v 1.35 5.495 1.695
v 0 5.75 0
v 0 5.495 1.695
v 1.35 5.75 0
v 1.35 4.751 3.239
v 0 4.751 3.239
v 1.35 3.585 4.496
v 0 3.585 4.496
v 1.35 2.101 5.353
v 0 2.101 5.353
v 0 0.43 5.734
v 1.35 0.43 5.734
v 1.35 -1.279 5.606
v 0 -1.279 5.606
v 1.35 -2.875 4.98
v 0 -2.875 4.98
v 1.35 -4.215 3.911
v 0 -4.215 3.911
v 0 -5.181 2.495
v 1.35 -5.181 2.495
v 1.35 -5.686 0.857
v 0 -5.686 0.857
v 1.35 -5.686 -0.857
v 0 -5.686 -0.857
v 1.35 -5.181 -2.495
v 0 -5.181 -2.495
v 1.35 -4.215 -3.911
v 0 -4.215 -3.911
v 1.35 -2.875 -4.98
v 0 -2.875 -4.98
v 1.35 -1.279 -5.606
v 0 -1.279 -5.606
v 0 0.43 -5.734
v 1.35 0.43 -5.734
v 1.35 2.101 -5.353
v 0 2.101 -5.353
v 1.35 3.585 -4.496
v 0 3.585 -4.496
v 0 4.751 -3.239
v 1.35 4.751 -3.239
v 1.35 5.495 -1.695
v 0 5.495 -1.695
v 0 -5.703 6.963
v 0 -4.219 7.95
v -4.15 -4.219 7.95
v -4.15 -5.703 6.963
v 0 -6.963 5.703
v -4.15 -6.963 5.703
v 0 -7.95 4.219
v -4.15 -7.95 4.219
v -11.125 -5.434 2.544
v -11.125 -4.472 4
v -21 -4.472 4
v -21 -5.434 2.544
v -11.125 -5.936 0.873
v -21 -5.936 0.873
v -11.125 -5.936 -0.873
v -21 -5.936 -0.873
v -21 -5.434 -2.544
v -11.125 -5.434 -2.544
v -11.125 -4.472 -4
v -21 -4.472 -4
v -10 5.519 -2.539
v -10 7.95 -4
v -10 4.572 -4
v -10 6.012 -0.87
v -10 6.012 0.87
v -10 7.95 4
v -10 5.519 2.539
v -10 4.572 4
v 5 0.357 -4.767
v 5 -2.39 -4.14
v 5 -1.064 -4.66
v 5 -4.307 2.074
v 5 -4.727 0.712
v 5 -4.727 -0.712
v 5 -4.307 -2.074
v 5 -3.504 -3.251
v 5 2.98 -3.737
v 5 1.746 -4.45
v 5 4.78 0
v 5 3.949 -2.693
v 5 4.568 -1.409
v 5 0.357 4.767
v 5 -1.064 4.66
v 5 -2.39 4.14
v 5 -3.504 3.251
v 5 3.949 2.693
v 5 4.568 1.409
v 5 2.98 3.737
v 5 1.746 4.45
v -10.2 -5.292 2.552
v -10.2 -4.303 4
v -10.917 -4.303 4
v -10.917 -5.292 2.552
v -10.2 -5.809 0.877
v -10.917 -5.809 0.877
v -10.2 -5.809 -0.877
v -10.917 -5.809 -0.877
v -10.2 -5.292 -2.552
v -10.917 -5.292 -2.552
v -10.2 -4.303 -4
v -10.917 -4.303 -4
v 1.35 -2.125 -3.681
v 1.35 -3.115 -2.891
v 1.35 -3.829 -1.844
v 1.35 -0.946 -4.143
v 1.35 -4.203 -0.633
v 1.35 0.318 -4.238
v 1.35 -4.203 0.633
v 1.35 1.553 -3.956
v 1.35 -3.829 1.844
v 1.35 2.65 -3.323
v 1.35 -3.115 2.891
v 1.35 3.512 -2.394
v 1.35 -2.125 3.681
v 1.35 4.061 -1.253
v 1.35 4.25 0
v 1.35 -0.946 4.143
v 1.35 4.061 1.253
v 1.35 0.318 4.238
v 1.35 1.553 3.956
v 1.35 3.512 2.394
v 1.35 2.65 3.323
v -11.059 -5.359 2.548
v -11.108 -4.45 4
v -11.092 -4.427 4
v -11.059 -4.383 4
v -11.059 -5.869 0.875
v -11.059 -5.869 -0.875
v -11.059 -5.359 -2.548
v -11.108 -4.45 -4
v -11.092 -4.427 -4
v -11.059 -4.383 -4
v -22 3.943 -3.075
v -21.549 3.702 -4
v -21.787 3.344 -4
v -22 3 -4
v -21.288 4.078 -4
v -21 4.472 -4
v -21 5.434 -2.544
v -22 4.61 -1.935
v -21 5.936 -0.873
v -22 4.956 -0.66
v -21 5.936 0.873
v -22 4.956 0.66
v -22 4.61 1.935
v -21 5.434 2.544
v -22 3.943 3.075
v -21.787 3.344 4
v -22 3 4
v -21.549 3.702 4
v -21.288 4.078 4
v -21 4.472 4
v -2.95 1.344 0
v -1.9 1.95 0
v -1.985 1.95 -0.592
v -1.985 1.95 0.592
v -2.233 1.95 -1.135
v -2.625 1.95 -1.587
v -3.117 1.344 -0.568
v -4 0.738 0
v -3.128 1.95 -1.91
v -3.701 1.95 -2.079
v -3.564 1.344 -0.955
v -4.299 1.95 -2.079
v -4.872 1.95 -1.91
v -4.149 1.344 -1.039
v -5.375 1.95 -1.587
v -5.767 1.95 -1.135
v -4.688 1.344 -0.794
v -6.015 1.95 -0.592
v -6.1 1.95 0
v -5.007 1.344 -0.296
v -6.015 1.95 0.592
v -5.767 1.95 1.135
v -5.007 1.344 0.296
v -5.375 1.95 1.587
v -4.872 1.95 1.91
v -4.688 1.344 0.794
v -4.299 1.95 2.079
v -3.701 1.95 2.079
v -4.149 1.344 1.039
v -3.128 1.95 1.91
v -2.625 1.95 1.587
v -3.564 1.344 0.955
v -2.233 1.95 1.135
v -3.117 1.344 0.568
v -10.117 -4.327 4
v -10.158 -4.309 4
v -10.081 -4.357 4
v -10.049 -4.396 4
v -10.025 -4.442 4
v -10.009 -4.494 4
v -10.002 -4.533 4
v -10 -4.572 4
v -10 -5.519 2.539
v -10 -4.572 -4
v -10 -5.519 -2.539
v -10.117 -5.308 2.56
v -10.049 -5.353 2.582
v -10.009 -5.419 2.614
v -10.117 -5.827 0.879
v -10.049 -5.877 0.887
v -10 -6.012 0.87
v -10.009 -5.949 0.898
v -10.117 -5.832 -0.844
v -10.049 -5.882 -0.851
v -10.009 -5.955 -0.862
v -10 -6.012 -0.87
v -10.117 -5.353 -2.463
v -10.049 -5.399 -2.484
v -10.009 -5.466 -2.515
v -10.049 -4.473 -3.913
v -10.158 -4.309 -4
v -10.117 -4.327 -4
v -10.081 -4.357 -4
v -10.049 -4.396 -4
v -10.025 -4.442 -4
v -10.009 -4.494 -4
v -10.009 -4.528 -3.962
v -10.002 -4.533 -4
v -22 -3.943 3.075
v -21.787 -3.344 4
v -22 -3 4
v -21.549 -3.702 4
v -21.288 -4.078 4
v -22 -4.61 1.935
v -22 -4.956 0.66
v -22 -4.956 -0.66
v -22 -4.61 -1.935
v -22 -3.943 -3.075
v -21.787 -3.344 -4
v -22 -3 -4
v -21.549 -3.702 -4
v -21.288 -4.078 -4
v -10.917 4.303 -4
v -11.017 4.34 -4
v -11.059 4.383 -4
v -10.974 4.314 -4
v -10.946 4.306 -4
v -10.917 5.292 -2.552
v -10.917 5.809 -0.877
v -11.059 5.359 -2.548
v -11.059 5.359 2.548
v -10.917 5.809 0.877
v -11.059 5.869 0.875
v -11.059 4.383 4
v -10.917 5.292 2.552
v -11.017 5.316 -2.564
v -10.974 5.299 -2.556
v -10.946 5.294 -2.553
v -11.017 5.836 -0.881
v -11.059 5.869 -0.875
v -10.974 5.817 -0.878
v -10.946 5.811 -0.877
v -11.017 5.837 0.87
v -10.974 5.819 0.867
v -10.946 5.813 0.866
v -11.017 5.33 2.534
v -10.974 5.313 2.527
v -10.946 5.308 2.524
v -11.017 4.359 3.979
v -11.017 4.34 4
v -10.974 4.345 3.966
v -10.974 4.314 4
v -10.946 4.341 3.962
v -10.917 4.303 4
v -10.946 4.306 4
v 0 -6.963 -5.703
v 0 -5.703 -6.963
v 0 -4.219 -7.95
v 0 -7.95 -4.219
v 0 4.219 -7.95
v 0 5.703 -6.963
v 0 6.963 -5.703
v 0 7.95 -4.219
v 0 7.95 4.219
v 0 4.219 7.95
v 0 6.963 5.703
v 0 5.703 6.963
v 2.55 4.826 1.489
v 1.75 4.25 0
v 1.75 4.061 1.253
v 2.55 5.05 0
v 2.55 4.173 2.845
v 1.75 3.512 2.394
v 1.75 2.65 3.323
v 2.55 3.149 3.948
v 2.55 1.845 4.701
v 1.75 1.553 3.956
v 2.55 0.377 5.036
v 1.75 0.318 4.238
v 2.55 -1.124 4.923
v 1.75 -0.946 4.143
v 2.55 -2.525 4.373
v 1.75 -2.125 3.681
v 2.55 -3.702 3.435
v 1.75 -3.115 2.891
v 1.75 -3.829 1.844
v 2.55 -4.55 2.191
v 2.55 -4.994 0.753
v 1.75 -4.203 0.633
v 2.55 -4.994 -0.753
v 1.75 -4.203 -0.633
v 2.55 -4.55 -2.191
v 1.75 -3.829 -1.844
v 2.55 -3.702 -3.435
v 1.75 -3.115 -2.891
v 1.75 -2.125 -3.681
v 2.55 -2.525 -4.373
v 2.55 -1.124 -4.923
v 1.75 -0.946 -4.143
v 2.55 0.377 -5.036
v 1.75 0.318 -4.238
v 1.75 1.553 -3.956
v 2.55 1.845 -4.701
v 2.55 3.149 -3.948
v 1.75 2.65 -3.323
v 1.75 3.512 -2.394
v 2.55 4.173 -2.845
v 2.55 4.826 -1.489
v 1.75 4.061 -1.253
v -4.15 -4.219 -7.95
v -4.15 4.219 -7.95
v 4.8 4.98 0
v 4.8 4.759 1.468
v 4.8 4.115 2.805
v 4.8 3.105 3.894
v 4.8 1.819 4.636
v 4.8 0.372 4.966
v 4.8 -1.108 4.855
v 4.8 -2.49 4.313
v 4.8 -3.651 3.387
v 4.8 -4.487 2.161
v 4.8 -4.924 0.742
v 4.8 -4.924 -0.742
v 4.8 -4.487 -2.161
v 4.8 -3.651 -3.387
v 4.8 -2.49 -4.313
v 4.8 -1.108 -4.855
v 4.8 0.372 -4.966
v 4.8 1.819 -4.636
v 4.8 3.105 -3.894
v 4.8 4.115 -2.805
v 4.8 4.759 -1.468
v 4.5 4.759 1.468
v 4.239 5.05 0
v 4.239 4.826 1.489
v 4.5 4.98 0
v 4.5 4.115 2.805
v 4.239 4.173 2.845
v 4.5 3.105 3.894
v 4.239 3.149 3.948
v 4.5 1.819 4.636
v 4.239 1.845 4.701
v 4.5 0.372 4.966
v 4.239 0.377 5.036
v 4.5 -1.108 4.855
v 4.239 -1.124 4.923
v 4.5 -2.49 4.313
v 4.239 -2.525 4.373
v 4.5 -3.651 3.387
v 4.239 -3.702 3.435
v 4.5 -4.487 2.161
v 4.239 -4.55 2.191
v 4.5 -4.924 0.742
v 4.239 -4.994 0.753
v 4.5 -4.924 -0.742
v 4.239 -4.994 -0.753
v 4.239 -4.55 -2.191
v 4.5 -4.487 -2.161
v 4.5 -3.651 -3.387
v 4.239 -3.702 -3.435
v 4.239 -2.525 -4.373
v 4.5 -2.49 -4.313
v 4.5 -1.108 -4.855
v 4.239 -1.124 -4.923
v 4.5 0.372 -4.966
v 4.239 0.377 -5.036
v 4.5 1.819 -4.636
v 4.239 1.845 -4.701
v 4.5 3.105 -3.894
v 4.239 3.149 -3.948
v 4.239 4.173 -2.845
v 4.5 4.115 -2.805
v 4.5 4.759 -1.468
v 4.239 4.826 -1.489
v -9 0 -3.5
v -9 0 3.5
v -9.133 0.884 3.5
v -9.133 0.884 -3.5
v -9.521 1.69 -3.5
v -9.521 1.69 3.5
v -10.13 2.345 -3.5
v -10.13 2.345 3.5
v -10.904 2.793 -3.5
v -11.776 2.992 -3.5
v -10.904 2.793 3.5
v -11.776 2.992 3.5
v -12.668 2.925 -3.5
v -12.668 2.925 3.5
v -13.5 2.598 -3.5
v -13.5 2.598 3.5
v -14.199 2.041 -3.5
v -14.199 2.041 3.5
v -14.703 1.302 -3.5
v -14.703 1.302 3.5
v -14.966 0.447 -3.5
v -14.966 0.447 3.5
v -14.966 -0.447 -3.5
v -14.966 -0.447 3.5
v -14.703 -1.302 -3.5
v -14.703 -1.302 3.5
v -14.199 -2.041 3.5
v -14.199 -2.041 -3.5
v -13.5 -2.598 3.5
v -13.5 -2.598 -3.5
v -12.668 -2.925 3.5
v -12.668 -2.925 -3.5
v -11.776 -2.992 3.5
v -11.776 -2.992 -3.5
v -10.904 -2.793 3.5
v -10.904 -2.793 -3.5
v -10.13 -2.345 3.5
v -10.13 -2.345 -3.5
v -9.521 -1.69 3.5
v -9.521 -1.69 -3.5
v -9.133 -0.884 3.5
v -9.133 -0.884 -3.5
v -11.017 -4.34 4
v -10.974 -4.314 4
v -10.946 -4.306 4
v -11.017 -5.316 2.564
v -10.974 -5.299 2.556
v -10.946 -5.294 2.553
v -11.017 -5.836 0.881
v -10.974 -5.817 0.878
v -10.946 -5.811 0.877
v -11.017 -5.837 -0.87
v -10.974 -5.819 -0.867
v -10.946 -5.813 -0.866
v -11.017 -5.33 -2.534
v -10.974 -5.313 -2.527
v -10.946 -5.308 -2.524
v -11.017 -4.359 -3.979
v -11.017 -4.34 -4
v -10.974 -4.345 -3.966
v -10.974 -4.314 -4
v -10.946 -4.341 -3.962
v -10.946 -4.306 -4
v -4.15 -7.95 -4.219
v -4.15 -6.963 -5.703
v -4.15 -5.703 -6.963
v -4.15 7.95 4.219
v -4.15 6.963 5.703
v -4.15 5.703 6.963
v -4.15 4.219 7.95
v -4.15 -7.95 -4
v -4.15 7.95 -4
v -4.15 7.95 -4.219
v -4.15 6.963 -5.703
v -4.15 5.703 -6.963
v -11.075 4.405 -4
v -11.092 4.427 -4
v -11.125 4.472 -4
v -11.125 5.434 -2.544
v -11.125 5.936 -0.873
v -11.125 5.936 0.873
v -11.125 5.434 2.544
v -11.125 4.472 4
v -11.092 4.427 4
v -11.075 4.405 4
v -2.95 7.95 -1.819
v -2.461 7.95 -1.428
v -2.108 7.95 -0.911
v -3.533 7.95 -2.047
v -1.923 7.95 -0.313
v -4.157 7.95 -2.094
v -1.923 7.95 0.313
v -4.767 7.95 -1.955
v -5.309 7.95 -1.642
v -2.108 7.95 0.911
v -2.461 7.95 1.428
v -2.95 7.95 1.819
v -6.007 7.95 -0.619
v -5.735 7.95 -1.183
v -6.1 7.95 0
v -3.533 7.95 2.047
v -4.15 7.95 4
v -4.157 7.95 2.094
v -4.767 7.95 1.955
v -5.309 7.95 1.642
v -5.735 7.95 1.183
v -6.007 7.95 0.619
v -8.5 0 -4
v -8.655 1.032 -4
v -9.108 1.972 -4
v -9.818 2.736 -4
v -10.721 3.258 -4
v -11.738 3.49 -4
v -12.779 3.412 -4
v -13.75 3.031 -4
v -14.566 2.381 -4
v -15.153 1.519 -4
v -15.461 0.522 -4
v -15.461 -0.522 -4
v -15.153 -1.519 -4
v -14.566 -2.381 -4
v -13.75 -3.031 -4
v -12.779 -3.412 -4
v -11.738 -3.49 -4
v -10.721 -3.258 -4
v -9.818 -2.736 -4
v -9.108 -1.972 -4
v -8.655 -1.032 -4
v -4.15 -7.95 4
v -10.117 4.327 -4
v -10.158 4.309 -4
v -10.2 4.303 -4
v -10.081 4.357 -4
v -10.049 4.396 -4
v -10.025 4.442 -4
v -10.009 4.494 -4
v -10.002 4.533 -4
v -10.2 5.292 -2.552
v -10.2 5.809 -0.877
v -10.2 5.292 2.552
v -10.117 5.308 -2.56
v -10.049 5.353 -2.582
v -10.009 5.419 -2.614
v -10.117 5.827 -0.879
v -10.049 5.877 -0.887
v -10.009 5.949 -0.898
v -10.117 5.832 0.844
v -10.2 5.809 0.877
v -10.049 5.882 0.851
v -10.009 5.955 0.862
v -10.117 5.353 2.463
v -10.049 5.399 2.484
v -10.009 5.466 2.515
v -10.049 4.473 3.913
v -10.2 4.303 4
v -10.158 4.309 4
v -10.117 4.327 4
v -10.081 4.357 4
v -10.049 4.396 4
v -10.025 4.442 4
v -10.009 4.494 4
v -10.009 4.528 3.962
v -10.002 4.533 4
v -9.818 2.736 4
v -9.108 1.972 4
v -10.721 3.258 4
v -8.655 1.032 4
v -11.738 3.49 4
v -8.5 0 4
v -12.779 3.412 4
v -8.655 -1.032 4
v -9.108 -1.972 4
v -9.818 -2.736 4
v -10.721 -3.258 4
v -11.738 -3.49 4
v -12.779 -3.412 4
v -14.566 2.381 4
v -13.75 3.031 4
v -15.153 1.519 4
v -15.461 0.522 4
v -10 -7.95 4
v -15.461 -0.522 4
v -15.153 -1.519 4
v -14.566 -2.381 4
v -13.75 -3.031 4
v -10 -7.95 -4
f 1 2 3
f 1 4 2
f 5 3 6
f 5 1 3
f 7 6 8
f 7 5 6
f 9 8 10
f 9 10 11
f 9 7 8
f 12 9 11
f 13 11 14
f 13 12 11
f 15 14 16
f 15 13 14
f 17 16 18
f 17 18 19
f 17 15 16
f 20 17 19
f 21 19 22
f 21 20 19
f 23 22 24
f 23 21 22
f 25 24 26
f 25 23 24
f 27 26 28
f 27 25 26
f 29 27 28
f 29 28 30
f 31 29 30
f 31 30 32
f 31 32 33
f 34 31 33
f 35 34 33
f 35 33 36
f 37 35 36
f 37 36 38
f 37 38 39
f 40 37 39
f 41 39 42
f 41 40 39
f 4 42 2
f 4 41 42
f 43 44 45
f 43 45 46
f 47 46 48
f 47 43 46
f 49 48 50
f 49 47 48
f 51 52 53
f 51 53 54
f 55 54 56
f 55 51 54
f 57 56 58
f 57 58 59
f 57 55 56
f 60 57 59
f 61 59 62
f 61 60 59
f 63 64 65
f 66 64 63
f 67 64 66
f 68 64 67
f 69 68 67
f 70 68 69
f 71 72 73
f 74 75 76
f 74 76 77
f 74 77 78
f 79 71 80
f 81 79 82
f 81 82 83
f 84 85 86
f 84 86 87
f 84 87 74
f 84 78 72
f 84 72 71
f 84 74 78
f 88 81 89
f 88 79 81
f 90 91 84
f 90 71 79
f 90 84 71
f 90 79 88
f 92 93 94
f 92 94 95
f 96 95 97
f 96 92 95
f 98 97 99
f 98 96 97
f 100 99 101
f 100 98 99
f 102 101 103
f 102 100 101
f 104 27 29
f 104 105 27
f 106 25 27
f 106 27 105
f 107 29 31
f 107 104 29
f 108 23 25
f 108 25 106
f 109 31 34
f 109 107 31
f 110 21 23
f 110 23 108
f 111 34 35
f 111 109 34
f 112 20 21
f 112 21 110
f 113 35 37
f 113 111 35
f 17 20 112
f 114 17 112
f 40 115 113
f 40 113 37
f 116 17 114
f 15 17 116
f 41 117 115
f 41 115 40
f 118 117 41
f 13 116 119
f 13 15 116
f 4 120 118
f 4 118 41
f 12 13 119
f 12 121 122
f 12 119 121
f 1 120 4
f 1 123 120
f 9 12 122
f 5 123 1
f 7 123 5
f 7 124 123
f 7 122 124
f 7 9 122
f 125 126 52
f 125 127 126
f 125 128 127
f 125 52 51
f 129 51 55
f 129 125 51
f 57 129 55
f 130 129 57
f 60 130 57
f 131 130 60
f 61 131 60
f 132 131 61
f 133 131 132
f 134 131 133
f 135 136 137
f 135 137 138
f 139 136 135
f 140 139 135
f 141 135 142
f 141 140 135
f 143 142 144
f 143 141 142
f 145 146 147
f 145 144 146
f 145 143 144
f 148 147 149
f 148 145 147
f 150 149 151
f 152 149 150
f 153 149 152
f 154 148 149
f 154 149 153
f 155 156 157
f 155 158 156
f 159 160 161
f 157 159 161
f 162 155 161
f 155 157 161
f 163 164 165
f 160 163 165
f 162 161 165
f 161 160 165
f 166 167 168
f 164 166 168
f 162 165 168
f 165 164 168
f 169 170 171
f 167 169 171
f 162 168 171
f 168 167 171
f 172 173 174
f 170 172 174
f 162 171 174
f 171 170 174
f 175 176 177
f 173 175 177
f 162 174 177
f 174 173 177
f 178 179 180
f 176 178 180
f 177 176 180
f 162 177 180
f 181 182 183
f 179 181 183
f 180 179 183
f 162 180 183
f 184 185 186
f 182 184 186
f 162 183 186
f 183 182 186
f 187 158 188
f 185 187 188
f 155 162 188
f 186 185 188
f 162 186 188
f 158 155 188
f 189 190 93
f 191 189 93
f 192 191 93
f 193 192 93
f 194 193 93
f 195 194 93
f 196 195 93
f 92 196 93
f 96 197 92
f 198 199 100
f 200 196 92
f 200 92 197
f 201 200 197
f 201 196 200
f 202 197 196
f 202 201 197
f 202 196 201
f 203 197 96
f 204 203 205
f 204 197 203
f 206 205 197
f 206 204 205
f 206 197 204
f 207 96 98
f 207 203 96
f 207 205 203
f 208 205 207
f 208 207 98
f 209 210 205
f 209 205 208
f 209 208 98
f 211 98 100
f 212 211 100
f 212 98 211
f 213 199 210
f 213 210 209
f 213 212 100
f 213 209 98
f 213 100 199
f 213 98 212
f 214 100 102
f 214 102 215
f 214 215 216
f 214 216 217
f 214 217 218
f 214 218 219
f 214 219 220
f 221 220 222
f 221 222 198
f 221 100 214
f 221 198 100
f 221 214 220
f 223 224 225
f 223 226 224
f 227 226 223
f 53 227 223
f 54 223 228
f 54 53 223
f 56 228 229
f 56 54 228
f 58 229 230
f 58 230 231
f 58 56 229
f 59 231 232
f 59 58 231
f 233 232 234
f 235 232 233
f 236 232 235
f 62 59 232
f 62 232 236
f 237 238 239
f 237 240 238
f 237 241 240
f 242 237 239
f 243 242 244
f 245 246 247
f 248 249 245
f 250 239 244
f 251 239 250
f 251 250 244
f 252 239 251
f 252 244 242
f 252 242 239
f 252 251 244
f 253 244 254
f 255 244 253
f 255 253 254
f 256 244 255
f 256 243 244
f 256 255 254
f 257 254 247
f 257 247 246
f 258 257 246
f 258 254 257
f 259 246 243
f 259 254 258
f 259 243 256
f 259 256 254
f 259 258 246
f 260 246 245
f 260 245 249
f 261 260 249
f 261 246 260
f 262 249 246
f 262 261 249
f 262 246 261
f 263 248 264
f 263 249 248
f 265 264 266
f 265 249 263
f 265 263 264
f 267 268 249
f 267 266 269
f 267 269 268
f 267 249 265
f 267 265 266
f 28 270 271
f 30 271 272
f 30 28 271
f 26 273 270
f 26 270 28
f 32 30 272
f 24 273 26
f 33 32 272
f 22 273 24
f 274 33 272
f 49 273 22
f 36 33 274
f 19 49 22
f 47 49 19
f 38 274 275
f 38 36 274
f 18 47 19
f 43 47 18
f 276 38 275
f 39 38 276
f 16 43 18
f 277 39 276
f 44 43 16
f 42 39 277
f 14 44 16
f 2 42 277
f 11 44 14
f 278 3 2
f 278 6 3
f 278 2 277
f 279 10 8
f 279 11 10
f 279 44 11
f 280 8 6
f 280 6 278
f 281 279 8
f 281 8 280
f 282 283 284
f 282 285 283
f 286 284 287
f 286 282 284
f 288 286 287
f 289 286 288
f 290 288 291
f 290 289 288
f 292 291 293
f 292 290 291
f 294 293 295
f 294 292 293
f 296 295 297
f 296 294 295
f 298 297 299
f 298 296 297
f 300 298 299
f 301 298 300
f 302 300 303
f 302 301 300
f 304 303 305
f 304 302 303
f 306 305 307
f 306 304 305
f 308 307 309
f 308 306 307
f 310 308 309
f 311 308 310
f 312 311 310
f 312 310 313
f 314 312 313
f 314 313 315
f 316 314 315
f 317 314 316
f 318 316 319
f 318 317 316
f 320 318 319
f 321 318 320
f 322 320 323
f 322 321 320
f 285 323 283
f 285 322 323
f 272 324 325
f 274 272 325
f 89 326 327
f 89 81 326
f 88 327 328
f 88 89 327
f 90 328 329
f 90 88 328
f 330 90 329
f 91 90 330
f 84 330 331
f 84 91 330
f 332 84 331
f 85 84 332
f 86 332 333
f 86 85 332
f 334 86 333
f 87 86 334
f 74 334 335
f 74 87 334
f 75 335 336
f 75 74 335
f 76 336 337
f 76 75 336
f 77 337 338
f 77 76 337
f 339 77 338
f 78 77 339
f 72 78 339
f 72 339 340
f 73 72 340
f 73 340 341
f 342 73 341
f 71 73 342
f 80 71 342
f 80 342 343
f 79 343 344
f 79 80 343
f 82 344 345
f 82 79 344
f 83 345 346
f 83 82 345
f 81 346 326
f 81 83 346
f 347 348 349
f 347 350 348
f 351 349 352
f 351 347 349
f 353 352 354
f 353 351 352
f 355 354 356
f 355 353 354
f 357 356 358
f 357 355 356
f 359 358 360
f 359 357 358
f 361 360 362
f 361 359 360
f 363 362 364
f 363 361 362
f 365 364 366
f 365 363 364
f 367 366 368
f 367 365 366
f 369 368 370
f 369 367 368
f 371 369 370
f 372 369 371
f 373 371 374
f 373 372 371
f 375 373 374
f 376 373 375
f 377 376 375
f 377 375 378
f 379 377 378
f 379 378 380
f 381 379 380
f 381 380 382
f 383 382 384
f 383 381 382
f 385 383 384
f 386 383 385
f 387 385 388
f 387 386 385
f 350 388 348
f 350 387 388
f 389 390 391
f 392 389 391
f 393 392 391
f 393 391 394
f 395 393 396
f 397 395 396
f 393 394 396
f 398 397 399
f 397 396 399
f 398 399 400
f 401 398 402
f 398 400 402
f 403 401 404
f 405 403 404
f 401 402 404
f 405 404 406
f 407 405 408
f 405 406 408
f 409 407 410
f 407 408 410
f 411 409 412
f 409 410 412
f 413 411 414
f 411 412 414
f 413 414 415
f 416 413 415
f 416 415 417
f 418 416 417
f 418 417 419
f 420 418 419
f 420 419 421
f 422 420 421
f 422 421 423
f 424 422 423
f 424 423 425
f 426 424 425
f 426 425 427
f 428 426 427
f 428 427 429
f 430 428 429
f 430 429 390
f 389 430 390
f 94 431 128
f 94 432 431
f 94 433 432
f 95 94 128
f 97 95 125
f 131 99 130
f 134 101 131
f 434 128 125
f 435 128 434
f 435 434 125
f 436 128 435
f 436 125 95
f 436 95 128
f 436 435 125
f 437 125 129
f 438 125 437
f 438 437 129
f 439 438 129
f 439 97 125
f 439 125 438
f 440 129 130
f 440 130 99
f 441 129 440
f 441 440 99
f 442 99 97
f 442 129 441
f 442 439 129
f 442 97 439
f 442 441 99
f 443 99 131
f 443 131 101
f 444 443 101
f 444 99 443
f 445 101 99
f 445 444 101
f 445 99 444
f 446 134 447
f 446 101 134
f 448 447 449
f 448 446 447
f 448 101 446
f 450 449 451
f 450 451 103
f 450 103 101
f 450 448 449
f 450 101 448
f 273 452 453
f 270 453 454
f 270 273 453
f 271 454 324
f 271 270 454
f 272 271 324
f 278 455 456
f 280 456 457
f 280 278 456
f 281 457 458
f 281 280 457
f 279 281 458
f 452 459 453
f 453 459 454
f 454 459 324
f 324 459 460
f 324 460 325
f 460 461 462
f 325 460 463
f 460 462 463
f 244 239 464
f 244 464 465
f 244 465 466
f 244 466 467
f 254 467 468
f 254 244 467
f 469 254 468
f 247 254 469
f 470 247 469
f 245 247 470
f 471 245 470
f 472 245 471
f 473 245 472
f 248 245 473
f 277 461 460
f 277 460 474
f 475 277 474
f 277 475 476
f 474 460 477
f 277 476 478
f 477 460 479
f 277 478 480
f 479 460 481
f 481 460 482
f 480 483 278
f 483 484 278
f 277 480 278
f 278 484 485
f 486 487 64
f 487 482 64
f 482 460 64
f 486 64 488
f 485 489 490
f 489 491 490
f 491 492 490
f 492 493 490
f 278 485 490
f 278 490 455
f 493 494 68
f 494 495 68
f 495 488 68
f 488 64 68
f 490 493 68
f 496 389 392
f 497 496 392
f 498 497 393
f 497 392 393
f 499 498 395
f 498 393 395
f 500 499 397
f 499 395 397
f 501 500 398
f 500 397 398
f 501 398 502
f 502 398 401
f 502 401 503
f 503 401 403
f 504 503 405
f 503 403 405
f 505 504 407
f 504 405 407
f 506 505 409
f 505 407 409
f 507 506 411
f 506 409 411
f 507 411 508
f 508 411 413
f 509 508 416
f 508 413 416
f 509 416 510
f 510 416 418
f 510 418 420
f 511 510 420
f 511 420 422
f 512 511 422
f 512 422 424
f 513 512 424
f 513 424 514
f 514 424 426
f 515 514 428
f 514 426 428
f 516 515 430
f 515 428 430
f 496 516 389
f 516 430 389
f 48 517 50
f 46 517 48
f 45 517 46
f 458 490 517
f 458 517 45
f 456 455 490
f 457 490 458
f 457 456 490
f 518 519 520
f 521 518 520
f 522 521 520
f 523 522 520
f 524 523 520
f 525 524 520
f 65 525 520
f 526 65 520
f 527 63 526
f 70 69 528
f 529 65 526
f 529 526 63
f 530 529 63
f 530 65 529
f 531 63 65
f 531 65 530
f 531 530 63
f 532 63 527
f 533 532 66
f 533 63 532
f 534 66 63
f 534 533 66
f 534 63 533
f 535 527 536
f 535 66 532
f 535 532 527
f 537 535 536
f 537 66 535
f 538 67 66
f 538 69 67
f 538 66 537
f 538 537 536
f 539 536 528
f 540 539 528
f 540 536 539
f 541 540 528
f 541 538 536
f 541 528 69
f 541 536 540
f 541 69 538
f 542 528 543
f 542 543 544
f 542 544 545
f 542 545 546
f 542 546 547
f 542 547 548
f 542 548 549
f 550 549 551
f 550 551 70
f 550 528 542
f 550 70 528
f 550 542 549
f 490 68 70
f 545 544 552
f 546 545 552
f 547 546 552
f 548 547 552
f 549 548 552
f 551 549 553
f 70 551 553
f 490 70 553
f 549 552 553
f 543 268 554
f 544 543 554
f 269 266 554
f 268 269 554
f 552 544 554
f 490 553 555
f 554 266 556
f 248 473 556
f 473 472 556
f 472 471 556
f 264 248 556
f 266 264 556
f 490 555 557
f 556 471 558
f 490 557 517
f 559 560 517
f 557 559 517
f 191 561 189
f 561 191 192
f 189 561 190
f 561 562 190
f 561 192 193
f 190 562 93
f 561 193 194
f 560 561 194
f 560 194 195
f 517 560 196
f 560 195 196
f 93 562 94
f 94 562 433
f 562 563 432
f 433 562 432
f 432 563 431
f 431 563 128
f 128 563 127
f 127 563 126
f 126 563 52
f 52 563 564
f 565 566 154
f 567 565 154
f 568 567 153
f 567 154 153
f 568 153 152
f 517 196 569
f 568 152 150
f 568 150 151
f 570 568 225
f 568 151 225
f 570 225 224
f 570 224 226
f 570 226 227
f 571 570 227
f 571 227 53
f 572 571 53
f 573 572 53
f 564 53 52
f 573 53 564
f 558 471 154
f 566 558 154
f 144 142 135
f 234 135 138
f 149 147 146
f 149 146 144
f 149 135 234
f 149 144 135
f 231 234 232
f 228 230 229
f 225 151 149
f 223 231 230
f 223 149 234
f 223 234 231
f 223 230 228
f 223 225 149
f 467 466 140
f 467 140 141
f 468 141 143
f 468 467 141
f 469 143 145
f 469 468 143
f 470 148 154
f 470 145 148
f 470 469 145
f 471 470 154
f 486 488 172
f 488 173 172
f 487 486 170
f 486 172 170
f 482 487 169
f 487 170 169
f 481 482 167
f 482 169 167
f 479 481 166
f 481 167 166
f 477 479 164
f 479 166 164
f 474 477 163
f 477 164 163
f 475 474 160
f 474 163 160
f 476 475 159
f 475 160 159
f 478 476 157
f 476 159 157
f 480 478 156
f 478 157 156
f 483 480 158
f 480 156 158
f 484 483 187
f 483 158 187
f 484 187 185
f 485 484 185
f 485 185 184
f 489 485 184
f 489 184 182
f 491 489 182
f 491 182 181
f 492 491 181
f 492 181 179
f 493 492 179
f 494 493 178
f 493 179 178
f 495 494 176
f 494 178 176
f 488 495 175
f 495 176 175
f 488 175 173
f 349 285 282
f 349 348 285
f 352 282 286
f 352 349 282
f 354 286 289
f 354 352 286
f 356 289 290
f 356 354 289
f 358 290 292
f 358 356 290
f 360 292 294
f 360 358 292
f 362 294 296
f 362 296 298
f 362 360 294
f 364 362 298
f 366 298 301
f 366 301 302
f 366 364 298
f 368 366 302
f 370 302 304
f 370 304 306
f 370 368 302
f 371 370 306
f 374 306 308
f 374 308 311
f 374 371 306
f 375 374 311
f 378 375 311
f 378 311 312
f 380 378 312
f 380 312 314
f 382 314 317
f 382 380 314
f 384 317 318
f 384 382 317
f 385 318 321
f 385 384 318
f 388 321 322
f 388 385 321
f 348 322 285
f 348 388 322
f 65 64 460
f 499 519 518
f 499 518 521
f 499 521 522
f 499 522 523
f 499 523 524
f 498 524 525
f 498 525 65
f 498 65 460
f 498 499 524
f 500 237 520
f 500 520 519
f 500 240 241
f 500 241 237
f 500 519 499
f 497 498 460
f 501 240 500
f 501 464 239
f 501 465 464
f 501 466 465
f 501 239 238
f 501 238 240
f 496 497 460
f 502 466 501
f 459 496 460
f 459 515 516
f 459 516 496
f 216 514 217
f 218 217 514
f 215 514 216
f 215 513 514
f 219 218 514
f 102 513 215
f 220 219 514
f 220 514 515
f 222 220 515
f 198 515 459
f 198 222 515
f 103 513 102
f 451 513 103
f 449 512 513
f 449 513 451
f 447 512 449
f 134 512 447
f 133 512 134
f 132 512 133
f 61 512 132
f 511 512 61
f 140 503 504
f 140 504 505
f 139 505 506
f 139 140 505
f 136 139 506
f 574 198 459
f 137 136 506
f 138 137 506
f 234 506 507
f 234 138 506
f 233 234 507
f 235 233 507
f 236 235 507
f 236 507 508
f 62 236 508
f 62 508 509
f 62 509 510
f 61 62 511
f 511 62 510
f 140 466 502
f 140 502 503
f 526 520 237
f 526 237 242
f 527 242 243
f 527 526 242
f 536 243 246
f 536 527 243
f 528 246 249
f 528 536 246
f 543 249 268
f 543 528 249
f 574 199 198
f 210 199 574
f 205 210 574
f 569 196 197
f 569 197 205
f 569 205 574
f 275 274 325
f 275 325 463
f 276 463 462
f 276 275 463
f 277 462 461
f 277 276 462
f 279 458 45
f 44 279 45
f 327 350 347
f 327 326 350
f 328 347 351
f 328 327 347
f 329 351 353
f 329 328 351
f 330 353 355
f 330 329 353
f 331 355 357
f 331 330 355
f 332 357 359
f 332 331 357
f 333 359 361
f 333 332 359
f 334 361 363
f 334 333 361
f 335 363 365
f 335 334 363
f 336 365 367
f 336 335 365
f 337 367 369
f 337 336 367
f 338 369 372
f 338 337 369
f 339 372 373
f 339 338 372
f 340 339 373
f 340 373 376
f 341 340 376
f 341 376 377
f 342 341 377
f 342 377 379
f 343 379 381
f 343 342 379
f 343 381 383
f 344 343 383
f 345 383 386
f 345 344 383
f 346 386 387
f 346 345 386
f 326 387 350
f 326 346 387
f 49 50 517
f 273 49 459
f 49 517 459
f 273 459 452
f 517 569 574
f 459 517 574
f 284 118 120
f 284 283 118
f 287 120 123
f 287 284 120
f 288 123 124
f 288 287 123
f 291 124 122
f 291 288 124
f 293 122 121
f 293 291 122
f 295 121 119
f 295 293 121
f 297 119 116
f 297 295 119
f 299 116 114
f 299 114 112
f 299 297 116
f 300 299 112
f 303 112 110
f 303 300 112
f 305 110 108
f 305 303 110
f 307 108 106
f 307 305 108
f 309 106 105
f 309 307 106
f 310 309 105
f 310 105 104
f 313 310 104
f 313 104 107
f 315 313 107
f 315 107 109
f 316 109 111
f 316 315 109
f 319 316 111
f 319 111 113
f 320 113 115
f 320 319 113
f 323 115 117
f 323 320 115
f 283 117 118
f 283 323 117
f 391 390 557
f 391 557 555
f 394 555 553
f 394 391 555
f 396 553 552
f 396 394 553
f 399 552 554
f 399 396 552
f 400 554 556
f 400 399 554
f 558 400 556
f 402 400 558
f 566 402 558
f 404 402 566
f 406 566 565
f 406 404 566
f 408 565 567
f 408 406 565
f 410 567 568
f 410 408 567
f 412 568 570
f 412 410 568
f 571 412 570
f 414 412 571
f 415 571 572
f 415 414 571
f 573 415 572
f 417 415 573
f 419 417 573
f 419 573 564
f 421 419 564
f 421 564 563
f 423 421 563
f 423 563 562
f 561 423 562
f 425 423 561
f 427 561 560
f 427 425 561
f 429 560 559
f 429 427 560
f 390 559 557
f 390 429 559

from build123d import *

# Parameters (mm, degrees)
O_L_DEPTH             = 17.85
CUT_EXTRUDE4_REACH    = 17
CUT_EXTRUDE2_REACH    = 13.95
SKETCH4_R             = 3
CHAMFER4_SIZE         = 0.5
M5_TAPPED_HOLE1_D     = 4.2
M5_TAPPED_HOLE1_DEPTH = 6
M5_TAPPED_HOLE1_TIP   = 1.212435565


with BuildPart() as part:
    # Sketch1 → Revolve1 (revolve)
    with BuildSketch(Plane.XY):
        with BuildLine():
            Line((-22, 0), (-22, 5))
            Line((-22, 5), (-21, 6))
            Line((-21, 6), (-11.125, 6))
            Line((-11.125, 6), (-11.058578644, 5.933578644))
            ThreePointArc((-11.058578644, 5.933578644), (-10.993693974, 5.890224093), (-10.917157288, 5.875))
            Line((-10.917157288, 5.875), (-10.2, 5.875))
            ThreePointArc((-10.2, 5.875), (-10.058578644, 5.933578644), (-10, 6.075))
            Line((-10, 6.075), (-10, 9))
            Line((-10, 9), (0, 9))
            Line((0, 9), (0, 5.75))
            Line((0, 5.75), (1.35, 5.75))
            Line((1.35, 5.75), (1.35, 4.25))
            Line((1.35, 4.25), (1.75, 4.25))
            Line((1.75, 4.25), (2.55, 5.05))
            Line((2.55, 5.05), (4.238756443, 5.05))
            Line((4.238756443, 5.05), (4.5, 4.98))
            Line((4.5, 4.98), (4.8, 4.98))
            Line((4.8, 4.98), (5, 4.78))
            Line((5, 4.78), (5, 0))
            Line((5, 0), (-22, 0))
        make_face()
    revolve(axis=Axis((0, 0, 0), (1, 0, 0)))

    # Sketch3 → O-L (cut)
    with BuildSketch(Plane.ZY.offset(22)):
        with BuildLine():
            Line((-4, 8.062257748), (-4, -8.062257748))
            ThreePointArc((-4, -8.062257748), (-9, 0), (-4, 8.062257748))
        make_face()
        with BuildLine():
            Line((4, 8.062257748), (4, -8.062257748))
            ThreePointArc((4, -8.062257748), (9, 0), (4, 8.062257748))
        make_face()
    extrude(amount=-O_L_DEPTH, mode=Mode.SUBTRACT)

    # Sketch6 → Cut-Extrude4 (cut, up to next)
    with BuildSketch(Plane.ZY.offset(10), mode=Mode.PRIVATE) as cut_extrude4_sk1:
        with BuildLine():
            Line((-4.218708333, 7.95), (4.218708333, 7.95))
            ThreePointArc((4.218708333, 7.95), (0, 9), (-4.218708333, 7.95))
        make_face()
    cut_extrude4_tool1 = extrude(cut_extrude4_sk1.sketch, amount=-CUT_EXTRUDE4_REACH, mode=Mode.PRIVATE) & part.part
    add(cut_extrude4_tool1.solids().sort_by_distance((-10, 8.372173, 0))[0], mode=Mode.SUBTRACT)
    # Sketch6 → Cut-Extrude4 (cut, up to next)
    with BuildSketch(Plane.ZY.offset(10), mode=Mode.PRIVATE) as cut_extrude4_sk2:
        with BuildLine():
            Line((7.95, 4.218708333), (7.95, -4.218708333))
            ThreePointArc((7.95, -4.218708333), (9, 0), (7.95, 4.218708333))
        make_face()
    cut_extrude4_tool2 = extrude(cut_extrude4_sk2.sketch, amount=-CUT_EXTRUDE4_REACH, mode=Mode.PRIVATE) & part.part
    add(cut_extrude4_tool2.solids().sort_by_distance((-10, 0, 8.372173))[0], mode=Mode.SUBTRACT)
    # Sketch6 → Cut-Extrude4 (cut, up to next)
    with BuildSketch(Plane.ZY.offset(10), mode=Mode.PRIVATE) as cut_extrude4_sk3:
        with BuildLine():
            Line((4.218708333, -7.95), (-4.218708333, -7.95))
            ThreePointArc((-4.218708333, -7.95), (0, -9), (4.218708333, -7.95))
        make_face()
    cut_extrude4_tool3 = extrude(cut_extrude4_sk3.sketch, amount=-CUT_EXTRUDE4_REACH, mode=Mode.PRIVATE) & part.part
    add(cut_extrude4_tool3.solids().sort_by_distance((-10, -8.372173, 0))[0], mode=Mode.SUBTRACT)
    # Sketch6 → Cut-Extrude4 (cut, up to next)
    with BuildSketch(Plane.ZY.offset(10), mode=Mode.PRIVATE) as cut_extrude4_sk4:
        with BuildLine():
            Line((-7.95, -4.218708333), (-7.95, 4.218708333))
            ThreePointArc((-7.95, 4.218708333), (-9, 0), (-7.95, -4.218708333))
        make_face()
    cut_extrude4_tool4 = extrude(cut_extrude4_sk4.sketch, amount=-CUT_EXTRUDE4_REACH, mode=Mode.PRIVATE) & part.part
    add(cut_extrude4_tool4.solids().sort_by_distance((-10, 0, -8.372173))[0], mode=Mode.SUBTRACT)

    # Sketch4 → Cut-Extrude2 (cut, up to next)
    with BuildSketch(Plane.XY.offset(4), mode=Mode.PRIVATE) as cut_extrude2_sk1:
        with Locations((-12, 0)):
            Circle(SKETCH4_R)
    cut_extrude2_tool1 = extrude(cut_extrude2_sk1.sketch, amount=-CUT_EXTRUDE2_REACH, mode=Mode.PRIVATE) & part.part
    add(cut_extrude2_tool1.solids().sort_by_distance((-12, 0, 4))[0], mode=Mode.SUBTRACT)

    # Chamfer4
    chamfer4_edges = [part.edges().sort_by_distance(p)[0] for p in [
        (-15, 0, 4),
        (-15, 0, -4),
    ]]
    chamfer(chamfer4_edges, length=CHAMFER4_SIZE)

    # M5 Tapped Hole1
    with Locations(Plane(origin=(0, 7.95, 0), x_dir=(1, 0, 0), z_dir=(0, 1, 0))):
        with Locations((-4, 0)):
            Hole(M5_TAPPED_HOLE1_D / 2, depth=M5_TAPPED_HOLE1_DEPTH)
            with Locations((0, 0, -(M5_TAPPED_HOLE1_DEPTH + M5_TAPPED_HOLE1_TIP / 2))):  # 120° drill point
                Cone(0, M5_TAPPED_HOLE1_D / 2, M5_TAPPED_HOLE1_TIP, mode=Mode.SUBTRACT)


solid = part.part
